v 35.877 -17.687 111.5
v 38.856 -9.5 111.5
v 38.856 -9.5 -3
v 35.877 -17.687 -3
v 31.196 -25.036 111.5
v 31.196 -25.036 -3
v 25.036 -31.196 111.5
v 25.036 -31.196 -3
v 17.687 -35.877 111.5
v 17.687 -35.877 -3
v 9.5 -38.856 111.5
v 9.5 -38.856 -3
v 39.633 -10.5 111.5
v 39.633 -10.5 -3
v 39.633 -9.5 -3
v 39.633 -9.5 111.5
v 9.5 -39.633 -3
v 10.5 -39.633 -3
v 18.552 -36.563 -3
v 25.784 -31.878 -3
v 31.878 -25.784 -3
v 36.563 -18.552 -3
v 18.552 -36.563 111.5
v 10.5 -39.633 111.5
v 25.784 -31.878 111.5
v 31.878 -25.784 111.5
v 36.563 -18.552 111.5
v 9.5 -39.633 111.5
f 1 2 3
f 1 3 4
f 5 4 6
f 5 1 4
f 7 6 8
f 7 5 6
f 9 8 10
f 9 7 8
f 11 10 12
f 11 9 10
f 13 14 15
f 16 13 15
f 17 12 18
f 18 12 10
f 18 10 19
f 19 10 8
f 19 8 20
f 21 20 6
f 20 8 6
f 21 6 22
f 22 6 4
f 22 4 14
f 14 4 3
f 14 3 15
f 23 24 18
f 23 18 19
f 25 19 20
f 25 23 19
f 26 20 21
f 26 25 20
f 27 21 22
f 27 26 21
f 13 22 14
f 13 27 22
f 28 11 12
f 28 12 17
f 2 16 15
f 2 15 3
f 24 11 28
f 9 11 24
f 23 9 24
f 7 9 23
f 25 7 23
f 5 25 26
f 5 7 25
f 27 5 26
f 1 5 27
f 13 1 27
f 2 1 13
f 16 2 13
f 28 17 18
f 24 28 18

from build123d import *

# Parameters (mm, degrees)
EXTRUDE_1_DEPTH = 114.5


with BuildPart() as part:
    # Эскиз1 → Бобышка-Вытянуть1 (new body)
    with BuildSketch(Plane.XY.offset(111.5)):
        with BuildLine():
            Line((9.5, -38.855501541), (9.5, -39.632688529))
            Line((9.5, -39.632688529), (10.5, -39.632688529))
            ThreePointArc((10.5, -39.632688529), (28.991378029, -28.991378029), (39.632688529, -10.5))
            Line((39.632688529, -10.5), (39.632688529, -9.5))
            Line((39.632688529, -9.5), (38.855501541, -9.5))
            ThreePointArc((38.855501541, -9.5), (28.284271247, -28.284271247), (9.5, -38.855501541))
        make_face()
    extrude(amount=-EXTRUDE_1_DEPTH)


solid = part.part
